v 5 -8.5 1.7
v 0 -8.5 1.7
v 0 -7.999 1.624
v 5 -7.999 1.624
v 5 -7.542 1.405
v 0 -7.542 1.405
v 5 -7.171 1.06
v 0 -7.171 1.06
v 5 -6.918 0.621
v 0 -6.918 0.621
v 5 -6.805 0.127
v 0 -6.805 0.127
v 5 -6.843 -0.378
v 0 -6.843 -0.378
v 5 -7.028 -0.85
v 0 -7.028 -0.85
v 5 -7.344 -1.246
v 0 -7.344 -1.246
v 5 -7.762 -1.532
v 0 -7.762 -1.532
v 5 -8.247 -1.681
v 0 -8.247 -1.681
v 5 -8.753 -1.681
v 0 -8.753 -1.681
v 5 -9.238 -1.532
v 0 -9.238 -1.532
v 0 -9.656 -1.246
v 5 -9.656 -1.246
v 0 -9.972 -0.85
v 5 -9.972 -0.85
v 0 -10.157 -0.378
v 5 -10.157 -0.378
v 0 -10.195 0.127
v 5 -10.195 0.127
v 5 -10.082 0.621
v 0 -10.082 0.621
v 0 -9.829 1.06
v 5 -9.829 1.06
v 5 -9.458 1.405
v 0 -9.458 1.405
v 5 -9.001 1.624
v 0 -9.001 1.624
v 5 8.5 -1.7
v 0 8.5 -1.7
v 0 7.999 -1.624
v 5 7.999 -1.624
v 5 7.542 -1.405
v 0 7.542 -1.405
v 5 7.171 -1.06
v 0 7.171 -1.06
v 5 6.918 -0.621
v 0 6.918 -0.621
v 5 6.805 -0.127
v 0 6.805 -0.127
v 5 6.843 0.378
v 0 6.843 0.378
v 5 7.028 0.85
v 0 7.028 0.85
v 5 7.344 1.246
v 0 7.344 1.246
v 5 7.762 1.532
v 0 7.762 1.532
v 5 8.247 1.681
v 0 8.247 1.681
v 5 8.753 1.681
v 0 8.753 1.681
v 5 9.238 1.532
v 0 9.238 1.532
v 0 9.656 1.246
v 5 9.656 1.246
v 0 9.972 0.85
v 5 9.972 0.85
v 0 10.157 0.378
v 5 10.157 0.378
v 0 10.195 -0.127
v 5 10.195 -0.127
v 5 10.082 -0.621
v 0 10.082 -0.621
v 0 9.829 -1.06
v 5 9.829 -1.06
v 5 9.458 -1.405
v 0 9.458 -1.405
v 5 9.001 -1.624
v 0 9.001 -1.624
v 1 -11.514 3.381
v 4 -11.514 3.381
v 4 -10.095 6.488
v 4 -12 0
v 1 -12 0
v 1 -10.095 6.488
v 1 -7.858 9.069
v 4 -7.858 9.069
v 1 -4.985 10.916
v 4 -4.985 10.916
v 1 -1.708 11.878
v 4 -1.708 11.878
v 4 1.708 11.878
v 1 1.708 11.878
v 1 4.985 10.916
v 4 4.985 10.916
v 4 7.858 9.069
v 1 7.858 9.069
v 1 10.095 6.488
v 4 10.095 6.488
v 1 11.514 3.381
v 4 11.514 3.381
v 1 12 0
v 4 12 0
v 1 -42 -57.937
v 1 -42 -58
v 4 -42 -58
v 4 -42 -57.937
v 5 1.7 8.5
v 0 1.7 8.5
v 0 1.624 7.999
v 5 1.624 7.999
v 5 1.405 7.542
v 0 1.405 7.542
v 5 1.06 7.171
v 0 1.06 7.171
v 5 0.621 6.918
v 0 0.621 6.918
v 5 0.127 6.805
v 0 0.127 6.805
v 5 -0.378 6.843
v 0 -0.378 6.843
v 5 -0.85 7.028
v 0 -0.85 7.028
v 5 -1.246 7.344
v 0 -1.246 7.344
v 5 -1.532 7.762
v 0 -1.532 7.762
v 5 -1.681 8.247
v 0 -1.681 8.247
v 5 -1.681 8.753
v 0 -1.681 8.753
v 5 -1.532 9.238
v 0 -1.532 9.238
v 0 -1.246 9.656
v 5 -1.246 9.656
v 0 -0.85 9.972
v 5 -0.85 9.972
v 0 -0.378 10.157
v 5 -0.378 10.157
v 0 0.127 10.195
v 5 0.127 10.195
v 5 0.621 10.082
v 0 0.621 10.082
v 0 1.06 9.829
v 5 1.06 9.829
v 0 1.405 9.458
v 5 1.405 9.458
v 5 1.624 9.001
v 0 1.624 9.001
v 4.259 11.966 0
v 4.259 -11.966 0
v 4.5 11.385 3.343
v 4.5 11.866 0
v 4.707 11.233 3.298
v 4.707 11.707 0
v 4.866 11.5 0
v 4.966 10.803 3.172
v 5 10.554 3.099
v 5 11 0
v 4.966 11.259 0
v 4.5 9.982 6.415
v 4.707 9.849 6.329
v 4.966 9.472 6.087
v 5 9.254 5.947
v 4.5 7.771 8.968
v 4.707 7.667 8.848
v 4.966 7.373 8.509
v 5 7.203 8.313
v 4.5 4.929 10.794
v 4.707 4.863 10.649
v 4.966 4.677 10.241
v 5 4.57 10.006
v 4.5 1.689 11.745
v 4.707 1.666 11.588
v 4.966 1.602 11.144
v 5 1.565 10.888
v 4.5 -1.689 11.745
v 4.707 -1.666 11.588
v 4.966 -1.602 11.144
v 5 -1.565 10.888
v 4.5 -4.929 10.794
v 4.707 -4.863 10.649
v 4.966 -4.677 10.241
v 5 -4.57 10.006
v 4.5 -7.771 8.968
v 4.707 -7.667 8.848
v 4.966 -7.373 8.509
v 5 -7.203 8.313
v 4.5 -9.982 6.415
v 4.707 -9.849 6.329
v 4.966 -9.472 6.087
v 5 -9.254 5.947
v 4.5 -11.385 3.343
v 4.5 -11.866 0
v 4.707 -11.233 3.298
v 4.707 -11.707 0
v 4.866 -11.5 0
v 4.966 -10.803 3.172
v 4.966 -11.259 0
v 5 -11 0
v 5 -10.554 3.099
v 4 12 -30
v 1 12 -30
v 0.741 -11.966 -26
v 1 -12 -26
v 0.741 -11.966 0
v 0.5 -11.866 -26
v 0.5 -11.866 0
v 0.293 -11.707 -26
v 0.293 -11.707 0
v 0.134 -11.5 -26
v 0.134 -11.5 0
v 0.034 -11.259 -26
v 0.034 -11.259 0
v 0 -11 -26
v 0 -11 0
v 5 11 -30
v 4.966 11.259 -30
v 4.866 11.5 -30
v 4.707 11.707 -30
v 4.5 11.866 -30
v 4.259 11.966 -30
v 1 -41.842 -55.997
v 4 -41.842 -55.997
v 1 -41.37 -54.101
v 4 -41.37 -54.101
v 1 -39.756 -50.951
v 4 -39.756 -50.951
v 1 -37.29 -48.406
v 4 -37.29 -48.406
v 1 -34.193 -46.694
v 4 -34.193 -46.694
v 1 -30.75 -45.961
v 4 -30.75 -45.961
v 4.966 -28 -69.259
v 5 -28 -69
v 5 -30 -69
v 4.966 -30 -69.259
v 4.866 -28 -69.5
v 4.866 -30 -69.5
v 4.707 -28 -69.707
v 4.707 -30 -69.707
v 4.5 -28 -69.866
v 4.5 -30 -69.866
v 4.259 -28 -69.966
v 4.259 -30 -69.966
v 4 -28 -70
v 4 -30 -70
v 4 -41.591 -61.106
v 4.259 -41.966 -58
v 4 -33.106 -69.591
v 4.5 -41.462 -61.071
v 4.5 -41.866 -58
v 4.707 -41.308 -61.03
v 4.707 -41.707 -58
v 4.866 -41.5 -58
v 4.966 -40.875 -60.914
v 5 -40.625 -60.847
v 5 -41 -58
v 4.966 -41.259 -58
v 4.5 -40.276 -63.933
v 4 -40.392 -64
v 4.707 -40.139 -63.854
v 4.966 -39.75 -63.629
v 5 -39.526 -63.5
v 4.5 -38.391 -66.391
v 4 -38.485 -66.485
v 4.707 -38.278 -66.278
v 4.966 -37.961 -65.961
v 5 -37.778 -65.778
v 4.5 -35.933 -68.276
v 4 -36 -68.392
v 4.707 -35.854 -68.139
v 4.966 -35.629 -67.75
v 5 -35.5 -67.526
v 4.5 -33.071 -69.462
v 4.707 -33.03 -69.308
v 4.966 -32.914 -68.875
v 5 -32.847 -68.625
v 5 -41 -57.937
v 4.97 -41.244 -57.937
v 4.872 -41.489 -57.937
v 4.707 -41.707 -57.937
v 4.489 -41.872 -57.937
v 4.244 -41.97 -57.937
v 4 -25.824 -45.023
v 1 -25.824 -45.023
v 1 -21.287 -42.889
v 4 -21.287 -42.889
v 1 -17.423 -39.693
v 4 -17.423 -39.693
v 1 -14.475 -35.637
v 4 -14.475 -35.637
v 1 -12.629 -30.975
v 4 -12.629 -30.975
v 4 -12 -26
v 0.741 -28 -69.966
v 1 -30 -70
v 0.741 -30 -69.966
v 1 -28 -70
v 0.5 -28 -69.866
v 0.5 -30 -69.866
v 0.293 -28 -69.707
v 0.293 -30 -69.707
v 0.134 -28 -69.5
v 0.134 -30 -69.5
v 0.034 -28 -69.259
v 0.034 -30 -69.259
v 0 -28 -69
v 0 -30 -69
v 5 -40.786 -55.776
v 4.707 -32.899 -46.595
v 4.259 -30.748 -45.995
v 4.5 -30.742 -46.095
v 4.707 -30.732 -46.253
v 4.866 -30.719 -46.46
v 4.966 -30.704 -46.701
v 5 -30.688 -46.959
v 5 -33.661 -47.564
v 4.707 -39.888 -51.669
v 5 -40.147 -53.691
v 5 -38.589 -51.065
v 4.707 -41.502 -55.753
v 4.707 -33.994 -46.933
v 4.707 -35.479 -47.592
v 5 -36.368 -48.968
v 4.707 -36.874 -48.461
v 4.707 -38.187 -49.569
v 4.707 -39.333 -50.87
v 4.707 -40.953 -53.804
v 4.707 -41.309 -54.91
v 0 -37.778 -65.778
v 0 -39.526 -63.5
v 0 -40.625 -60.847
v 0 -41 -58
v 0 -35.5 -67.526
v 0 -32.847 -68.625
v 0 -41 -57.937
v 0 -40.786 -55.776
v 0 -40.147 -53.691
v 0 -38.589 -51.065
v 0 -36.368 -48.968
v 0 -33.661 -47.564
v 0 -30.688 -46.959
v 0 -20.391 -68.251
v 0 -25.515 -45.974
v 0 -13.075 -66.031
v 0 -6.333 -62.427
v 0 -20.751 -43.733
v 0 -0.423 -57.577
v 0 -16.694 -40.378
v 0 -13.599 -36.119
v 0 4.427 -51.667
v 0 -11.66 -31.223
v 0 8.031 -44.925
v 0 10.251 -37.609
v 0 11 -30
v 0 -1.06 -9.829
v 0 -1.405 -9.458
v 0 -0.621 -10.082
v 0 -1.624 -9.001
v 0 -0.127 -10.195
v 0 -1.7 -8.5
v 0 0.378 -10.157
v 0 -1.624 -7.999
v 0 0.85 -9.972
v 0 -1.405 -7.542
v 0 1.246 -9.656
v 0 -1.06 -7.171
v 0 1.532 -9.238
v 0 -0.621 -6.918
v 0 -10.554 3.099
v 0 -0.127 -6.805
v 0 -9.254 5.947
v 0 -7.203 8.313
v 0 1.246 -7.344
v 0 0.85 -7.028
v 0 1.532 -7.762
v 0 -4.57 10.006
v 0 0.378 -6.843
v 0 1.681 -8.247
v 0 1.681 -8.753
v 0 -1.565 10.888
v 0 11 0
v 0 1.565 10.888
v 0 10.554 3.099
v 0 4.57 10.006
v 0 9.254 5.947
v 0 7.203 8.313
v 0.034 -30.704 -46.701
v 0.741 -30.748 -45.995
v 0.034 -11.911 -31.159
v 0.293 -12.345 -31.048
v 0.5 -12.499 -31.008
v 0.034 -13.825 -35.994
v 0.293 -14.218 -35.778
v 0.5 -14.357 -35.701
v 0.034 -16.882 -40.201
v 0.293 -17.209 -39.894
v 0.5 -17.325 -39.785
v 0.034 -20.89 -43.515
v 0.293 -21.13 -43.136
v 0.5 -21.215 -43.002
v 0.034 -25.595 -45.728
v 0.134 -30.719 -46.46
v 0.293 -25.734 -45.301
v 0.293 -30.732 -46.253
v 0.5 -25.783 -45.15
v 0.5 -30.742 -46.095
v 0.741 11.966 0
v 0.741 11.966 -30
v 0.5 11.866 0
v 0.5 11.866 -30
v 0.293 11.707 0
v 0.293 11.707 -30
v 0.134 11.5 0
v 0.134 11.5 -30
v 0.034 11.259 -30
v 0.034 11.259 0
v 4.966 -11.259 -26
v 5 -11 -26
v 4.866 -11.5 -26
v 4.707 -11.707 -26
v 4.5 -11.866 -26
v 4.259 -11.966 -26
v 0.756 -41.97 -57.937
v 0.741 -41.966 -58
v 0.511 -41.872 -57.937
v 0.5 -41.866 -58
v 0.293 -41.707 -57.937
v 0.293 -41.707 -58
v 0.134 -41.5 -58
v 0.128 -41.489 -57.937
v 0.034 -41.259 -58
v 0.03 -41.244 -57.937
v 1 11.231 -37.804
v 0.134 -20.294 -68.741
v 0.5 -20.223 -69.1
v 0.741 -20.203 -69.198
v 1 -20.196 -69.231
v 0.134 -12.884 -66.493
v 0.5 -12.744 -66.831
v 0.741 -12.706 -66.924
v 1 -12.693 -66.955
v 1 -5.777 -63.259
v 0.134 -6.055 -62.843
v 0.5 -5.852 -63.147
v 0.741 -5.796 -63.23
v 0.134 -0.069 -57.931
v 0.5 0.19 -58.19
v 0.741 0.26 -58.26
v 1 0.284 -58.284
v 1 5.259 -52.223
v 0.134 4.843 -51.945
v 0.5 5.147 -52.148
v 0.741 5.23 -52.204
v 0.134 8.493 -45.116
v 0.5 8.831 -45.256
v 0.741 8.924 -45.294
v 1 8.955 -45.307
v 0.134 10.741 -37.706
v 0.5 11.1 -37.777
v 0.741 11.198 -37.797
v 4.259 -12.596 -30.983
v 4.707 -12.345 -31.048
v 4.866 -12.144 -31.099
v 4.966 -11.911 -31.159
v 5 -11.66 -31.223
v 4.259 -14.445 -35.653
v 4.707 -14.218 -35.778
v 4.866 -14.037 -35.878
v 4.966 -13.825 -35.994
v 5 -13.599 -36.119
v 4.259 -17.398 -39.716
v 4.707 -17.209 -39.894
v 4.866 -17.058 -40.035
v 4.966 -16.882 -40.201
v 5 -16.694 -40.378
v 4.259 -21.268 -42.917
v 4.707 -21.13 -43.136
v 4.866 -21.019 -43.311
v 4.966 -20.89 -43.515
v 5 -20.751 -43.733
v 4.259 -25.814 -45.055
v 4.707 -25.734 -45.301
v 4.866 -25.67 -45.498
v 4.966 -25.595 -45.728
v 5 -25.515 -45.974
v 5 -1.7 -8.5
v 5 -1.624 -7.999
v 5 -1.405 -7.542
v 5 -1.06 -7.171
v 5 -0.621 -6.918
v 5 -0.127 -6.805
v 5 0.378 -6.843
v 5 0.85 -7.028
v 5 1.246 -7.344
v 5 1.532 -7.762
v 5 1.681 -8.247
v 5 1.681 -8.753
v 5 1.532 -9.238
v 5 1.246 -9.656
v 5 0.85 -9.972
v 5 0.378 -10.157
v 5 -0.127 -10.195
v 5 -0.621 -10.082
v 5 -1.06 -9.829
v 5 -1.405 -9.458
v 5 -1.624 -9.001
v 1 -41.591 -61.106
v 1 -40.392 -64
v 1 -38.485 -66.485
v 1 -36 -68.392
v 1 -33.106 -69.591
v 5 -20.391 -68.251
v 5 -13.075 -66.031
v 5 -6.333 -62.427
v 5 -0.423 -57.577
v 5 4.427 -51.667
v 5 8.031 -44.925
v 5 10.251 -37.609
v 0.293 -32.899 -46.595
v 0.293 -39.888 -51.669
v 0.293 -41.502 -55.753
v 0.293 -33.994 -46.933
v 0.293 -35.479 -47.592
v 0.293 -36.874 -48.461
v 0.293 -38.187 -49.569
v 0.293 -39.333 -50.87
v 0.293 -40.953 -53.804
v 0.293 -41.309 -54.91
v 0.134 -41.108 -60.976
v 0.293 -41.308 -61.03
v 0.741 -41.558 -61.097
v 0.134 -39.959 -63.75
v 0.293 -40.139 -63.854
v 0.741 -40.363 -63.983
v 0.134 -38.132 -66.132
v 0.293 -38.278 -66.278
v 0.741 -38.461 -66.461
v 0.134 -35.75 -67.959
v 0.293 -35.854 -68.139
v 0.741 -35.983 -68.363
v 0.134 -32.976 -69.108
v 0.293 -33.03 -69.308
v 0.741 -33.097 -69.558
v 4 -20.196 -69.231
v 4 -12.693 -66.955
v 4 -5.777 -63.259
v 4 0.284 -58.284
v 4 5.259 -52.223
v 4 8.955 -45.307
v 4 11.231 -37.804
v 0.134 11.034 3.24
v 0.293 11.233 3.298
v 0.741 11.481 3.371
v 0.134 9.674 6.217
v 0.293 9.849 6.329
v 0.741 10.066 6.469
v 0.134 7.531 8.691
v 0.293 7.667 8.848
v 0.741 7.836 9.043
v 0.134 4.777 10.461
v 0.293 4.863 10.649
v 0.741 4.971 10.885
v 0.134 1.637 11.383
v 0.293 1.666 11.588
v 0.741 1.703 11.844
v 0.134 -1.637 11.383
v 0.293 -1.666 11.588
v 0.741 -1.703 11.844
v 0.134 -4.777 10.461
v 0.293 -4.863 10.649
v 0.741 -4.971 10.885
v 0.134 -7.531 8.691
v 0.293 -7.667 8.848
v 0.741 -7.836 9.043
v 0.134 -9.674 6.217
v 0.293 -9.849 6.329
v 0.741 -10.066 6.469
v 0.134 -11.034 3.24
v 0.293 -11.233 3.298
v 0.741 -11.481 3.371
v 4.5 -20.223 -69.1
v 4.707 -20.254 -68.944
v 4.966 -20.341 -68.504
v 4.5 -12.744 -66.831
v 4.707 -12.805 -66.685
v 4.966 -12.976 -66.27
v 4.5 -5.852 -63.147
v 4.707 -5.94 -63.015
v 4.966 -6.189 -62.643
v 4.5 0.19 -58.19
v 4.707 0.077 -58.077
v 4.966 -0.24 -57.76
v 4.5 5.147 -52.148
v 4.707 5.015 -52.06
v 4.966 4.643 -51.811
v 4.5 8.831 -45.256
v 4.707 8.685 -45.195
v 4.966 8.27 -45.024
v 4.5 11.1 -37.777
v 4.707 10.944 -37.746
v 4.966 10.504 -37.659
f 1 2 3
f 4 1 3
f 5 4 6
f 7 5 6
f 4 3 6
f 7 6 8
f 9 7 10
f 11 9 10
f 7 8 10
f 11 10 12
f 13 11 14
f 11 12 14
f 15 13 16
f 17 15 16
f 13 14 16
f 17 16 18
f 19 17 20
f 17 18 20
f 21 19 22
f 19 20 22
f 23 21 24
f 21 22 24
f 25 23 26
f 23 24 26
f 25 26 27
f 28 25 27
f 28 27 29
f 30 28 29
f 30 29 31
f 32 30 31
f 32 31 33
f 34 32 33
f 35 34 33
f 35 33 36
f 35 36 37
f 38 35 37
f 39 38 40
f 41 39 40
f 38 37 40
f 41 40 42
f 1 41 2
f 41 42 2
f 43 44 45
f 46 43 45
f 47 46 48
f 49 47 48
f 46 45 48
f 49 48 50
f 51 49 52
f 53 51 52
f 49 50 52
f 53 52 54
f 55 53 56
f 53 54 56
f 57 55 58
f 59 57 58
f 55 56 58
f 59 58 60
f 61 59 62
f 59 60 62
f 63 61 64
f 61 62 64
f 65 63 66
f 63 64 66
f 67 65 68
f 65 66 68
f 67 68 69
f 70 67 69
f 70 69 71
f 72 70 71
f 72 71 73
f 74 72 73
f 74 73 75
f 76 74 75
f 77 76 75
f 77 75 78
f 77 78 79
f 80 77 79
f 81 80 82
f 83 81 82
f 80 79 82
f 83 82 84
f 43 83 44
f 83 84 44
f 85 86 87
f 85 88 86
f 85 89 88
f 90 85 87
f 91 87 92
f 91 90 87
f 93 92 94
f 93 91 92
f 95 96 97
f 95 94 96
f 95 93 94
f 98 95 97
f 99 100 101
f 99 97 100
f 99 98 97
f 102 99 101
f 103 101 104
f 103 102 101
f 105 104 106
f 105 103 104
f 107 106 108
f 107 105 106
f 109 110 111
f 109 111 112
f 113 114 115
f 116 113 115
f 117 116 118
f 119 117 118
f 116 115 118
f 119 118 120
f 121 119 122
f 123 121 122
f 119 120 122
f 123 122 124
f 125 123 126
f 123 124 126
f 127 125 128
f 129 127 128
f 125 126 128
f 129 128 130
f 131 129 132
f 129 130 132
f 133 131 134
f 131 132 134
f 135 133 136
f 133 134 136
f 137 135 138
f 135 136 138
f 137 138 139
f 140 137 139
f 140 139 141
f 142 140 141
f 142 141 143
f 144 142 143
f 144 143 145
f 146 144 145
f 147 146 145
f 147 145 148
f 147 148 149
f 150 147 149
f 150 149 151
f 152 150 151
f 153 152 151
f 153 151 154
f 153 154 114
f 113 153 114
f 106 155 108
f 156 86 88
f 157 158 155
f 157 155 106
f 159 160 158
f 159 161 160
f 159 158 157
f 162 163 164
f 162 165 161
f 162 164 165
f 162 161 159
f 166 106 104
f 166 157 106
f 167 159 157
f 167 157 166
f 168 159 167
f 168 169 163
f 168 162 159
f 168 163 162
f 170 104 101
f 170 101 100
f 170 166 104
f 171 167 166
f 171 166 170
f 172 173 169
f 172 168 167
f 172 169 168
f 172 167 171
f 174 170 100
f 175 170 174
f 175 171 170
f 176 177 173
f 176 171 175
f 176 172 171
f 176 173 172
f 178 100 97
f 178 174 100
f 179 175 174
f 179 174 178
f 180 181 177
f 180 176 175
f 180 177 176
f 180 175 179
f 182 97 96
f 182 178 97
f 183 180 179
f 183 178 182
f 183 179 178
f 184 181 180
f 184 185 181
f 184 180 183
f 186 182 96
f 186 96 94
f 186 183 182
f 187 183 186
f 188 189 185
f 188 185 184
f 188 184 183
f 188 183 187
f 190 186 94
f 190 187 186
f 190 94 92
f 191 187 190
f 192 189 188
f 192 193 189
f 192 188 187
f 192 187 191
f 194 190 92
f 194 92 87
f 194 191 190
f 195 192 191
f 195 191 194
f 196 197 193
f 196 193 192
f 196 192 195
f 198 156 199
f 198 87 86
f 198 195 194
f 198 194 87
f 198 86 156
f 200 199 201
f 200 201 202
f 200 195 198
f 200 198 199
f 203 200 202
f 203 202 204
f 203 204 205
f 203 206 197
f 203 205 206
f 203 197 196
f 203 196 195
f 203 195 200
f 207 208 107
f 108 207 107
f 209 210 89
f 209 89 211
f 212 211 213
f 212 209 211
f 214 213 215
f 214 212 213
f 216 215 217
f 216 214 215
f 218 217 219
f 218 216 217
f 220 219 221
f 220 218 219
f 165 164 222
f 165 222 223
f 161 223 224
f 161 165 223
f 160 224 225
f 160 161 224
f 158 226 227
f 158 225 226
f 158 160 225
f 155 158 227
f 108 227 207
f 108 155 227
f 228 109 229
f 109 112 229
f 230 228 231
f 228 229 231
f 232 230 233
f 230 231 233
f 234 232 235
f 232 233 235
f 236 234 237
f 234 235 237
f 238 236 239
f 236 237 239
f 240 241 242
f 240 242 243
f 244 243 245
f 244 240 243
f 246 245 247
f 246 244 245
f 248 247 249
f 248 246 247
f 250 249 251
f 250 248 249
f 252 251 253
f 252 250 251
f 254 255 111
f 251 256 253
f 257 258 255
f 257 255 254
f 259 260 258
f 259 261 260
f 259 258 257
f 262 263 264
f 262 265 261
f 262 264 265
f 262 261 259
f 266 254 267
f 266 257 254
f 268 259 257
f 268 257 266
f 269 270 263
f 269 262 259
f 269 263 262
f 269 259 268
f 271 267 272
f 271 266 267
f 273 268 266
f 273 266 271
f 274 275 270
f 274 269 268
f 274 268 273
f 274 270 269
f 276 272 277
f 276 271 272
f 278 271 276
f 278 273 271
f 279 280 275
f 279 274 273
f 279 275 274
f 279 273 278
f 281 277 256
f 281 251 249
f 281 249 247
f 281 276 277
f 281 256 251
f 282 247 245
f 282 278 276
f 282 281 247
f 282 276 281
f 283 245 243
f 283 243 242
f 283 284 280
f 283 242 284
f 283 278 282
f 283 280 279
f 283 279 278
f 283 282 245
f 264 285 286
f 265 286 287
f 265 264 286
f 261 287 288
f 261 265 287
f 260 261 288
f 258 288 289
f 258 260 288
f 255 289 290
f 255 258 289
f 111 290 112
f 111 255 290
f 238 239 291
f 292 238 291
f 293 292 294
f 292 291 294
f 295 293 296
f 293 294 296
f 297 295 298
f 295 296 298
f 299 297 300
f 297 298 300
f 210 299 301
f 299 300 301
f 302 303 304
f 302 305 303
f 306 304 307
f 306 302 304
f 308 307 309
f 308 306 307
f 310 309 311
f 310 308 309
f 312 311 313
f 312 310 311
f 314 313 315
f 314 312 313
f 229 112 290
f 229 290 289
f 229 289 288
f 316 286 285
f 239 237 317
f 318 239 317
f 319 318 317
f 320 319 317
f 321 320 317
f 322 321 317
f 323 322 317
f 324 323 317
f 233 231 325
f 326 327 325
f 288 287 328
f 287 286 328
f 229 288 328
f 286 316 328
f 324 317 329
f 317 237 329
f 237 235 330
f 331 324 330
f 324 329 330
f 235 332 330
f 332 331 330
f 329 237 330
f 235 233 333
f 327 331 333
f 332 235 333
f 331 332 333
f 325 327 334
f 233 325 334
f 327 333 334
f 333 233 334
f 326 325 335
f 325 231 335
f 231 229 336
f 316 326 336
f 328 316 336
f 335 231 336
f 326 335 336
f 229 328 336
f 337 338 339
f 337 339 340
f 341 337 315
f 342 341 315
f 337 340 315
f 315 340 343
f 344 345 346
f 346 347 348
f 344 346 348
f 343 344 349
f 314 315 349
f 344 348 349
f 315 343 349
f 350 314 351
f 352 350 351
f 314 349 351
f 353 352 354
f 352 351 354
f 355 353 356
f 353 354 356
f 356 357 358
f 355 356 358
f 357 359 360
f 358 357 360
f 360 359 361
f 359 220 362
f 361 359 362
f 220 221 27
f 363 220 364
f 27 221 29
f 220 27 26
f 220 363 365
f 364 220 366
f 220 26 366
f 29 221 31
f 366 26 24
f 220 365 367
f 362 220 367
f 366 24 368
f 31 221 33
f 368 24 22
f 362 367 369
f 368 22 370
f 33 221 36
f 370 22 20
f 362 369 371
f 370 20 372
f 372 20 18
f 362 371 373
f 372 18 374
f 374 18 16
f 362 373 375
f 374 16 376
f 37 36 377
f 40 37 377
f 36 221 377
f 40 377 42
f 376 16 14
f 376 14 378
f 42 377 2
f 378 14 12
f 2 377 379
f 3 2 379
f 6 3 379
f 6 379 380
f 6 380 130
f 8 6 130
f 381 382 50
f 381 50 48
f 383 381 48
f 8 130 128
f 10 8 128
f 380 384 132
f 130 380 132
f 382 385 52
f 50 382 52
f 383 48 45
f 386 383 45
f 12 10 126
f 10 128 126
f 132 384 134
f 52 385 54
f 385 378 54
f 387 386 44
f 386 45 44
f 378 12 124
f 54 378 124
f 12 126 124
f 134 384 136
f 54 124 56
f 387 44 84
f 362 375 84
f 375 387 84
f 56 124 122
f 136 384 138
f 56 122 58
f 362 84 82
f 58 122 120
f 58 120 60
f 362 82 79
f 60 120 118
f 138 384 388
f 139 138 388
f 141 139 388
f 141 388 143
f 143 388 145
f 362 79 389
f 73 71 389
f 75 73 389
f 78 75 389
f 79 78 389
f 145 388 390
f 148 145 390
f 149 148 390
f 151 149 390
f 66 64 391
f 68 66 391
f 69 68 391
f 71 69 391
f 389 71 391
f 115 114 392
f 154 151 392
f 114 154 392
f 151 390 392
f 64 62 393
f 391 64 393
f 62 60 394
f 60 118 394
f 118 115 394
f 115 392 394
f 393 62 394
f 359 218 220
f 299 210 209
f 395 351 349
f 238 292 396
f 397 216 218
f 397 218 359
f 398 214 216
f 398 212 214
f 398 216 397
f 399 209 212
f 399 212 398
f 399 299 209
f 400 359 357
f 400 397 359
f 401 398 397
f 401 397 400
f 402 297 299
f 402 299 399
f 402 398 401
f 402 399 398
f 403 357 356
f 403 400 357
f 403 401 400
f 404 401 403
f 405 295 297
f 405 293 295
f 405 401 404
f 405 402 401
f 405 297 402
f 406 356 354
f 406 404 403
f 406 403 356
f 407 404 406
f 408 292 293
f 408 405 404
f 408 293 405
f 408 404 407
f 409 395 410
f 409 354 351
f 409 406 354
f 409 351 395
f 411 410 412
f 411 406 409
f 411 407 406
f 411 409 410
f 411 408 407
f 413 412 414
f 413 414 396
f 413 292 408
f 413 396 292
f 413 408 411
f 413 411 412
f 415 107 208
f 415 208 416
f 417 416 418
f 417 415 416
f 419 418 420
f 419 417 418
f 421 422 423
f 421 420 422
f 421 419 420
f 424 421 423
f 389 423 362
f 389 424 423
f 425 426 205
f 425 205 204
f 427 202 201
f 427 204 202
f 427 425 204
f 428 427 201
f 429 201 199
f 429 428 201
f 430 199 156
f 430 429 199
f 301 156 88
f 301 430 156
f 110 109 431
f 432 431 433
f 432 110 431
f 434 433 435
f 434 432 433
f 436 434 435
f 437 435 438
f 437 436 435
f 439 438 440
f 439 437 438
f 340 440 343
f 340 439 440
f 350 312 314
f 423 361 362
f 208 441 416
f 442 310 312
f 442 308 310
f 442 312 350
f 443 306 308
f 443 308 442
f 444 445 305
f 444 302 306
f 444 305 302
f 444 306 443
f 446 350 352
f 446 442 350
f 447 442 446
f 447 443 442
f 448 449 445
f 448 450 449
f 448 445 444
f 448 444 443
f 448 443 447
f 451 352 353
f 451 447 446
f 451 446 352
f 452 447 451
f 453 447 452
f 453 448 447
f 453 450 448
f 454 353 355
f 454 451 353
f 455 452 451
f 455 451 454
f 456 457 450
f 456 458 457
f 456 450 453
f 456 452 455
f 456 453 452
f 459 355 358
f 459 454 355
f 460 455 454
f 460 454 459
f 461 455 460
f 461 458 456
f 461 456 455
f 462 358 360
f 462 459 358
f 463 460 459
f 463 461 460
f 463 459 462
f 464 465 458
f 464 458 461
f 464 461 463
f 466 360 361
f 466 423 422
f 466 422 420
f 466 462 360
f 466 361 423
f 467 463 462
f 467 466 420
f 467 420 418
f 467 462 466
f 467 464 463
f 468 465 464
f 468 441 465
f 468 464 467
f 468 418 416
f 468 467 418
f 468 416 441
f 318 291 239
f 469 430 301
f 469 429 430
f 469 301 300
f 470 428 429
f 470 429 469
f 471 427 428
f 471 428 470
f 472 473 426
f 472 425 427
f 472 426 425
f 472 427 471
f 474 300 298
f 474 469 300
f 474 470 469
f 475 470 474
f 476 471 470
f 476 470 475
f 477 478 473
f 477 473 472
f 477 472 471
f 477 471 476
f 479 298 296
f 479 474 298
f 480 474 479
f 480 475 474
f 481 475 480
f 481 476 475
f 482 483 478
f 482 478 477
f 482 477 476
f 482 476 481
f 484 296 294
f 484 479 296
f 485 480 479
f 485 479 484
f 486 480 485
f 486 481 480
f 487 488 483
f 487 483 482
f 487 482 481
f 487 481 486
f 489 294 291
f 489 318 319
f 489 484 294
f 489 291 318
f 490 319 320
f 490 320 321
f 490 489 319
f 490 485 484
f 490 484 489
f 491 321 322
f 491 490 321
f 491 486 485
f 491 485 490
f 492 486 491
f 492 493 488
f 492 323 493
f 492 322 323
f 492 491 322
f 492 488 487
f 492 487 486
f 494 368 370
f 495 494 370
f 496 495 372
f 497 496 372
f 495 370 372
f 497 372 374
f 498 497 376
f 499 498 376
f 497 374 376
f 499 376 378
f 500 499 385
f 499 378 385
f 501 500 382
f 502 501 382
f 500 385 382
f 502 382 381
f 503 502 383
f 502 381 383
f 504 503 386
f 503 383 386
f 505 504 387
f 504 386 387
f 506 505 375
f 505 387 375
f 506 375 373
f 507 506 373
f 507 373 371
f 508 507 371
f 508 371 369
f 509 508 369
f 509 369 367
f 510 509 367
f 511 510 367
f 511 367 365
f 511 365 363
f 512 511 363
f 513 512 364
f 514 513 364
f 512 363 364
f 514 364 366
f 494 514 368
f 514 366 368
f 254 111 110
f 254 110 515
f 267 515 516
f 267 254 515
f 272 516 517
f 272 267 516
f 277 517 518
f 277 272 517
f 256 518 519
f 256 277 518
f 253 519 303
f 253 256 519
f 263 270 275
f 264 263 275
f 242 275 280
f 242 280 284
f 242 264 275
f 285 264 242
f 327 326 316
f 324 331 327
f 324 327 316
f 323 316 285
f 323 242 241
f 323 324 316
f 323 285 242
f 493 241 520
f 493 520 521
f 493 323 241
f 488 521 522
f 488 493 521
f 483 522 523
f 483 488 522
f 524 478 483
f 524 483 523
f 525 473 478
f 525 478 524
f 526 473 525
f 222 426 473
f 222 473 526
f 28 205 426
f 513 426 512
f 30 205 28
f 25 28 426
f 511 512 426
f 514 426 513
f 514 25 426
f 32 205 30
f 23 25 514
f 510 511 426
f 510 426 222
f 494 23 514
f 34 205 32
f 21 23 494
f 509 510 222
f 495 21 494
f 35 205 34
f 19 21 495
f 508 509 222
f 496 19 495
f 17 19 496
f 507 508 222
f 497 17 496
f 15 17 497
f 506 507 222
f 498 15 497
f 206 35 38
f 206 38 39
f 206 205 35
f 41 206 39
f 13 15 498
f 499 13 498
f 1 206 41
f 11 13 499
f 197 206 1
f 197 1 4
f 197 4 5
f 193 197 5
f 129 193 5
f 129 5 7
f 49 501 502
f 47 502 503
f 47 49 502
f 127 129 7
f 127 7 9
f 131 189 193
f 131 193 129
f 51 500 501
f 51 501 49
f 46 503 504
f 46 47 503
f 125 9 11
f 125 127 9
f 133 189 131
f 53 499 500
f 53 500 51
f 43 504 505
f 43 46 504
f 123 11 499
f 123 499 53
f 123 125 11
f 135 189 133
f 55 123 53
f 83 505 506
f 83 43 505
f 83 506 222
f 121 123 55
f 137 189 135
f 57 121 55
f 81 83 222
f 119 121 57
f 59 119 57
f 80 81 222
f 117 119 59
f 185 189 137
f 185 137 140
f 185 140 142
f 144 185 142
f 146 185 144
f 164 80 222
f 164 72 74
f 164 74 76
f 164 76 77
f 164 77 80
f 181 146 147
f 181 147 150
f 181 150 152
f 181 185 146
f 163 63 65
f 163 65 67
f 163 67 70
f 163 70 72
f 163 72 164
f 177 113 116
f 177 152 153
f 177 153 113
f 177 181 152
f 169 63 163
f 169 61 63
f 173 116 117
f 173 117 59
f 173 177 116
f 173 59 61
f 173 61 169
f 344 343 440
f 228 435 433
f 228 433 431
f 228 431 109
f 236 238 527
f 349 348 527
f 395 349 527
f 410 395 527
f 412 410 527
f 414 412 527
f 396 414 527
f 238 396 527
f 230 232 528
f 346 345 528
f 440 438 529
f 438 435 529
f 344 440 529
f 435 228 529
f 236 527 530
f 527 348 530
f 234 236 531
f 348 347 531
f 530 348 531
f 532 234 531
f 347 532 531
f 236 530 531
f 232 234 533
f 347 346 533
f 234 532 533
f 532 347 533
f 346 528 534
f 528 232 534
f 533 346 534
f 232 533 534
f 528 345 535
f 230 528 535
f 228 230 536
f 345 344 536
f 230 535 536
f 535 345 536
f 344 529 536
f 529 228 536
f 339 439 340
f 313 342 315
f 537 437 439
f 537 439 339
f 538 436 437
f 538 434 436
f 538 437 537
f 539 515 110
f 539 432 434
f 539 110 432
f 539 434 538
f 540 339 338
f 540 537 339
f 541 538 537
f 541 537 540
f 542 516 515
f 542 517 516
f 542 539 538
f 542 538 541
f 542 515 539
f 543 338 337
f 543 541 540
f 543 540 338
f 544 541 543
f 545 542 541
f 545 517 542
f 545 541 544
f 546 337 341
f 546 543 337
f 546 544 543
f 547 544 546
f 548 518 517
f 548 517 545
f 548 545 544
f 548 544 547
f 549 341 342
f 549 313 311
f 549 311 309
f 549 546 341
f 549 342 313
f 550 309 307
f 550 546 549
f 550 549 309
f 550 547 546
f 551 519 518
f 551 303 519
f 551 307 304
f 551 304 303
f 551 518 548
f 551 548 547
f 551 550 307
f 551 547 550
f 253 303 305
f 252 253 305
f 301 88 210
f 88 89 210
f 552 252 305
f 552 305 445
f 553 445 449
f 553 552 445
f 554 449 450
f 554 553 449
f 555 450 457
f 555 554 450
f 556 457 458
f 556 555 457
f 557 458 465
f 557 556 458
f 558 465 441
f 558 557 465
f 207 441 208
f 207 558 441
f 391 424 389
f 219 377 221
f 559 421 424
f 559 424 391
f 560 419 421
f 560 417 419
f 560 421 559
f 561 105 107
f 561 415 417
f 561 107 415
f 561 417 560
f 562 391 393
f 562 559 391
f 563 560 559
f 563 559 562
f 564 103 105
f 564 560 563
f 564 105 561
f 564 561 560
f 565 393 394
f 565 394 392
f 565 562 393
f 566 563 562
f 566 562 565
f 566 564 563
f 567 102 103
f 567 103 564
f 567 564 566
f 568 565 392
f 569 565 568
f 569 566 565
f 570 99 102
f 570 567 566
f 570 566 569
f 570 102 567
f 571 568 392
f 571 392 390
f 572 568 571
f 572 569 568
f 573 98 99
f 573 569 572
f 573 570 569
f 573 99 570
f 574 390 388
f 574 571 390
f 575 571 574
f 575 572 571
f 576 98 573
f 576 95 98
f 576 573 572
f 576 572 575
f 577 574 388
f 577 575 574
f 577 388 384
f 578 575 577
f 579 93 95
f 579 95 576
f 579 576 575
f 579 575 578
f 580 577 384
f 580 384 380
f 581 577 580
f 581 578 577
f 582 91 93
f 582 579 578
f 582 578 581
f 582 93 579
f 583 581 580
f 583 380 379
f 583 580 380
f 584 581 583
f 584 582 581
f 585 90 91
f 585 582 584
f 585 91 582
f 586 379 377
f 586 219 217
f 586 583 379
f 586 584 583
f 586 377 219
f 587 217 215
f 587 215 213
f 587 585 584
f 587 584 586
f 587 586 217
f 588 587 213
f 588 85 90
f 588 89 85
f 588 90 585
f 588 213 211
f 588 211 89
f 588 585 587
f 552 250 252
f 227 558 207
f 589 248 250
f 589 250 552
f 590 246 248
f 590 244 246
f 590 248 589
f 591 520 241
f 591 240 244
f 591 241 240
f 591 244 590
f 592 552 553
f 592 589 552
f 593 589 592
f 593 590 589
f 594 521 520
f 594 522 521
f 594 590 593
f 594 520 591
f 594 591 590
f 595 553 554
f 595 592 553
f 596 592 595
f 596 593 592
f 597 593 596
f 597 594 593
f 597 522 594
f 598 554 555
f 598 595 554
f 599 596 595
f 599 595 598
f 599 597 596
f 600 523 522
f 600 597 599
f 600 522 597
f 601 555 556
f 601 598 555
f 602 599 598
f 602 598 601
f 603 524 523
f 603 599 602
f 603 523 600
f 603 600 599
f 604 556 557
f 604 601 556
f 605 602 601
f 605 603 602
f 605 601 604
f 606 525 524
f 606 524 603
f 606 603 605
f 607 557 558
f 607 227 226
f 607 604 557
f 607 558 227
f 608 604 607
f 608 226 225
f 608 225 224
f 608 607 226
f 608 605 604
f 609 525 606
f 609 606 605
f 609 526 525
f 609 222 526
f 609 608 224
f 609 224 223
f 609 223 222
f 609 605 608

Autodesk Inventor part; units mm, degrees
ref_plane "YZ Plane" through (0, 0, 0) normal (1, 0, 0) x (0, 1, 0)
ref_plane "XZ Plane" through (0, 0, 0) normal (0, 1, 0) x (-1, 0, 0)
ref_plane "XY Plane" through (0, 0, 0) normal (0, 0, 1) x (1, 0, 0)
sketch "スケッチ1" plane through (0, 0, 0) normal (1, 0, 0) x (0, 1, 0)
  circle A0 centre (0, 0) radius 12
  line L0 (12, 0) -> (-12, 0)
  line L1 (-12, 0) -> (-12, -70)
  line L2 (-12, -70) -> (12, -70)
  line L3 (12, -70) -> (12, 0)
  line L4 (-12, -70) -> (-42, -70)
  line L5 (-42, -70) -> (-42, -46)
  line L6 (-42, -46) -> (-12, -46)
  line L7 (-12, -46) -> (-12, -70)
  point P0 (-12, -46)
  dimension "d0" = 24
  dimension "d1" = 70
  dimension "d4" = 24
  dimension "d5" = 30
extrude "押し出し1" add sketch "スケッチ1" along normal blind 5
fillet "フィレット1" radius 20 1 edges at (2.5, -12, -46)
fillet "フィレット3" radius 40 1 edges at (2.5, 12, -70)
fillet "フィレット2" radius 12 2 edges at (2.5, -42, -46) (2.5, -42, -70)
sketch "スケッチ2" plane through (5, 0, 0) normal (1, 0, 0) x (0, 0, -1)
  circle A0 centre (0, 0) radius 8.5
  point P0 (0, 8.5)
  dimension "d8" = 17
hole "穴1" at (5, 8.5, 0) direction (-1, 0, 0) diameter 3.4 end through all clearance for "Flat Head Machine Screw" size "M3" standard "Ansi Metric M Profile"
pattern_circular "円形状パターン1" count 4 over 360 about axis through (0, 0, 0) along (1, 0, 0) of "穴1"
fillet "フィレット4" radius 1 16 edges at (5, -29, -70) (5, -38.4853, -66.4853) (5, -42, -57.9687) (5, -38.7464, -49.7216) (5, -12, -13) (5, 0, 12) (5, 12, -15) (5, 0.2843, -58.2843) (0, 12, -15) (0, 0, 12) (0, -12, -13) (0, -38.7464, -49.7216) (0, -42, -57.9687) (0, -38.4853, -66.4853) (0, -29, -70) (0, 0.2843, -58.2843)
properties part number "base9"
